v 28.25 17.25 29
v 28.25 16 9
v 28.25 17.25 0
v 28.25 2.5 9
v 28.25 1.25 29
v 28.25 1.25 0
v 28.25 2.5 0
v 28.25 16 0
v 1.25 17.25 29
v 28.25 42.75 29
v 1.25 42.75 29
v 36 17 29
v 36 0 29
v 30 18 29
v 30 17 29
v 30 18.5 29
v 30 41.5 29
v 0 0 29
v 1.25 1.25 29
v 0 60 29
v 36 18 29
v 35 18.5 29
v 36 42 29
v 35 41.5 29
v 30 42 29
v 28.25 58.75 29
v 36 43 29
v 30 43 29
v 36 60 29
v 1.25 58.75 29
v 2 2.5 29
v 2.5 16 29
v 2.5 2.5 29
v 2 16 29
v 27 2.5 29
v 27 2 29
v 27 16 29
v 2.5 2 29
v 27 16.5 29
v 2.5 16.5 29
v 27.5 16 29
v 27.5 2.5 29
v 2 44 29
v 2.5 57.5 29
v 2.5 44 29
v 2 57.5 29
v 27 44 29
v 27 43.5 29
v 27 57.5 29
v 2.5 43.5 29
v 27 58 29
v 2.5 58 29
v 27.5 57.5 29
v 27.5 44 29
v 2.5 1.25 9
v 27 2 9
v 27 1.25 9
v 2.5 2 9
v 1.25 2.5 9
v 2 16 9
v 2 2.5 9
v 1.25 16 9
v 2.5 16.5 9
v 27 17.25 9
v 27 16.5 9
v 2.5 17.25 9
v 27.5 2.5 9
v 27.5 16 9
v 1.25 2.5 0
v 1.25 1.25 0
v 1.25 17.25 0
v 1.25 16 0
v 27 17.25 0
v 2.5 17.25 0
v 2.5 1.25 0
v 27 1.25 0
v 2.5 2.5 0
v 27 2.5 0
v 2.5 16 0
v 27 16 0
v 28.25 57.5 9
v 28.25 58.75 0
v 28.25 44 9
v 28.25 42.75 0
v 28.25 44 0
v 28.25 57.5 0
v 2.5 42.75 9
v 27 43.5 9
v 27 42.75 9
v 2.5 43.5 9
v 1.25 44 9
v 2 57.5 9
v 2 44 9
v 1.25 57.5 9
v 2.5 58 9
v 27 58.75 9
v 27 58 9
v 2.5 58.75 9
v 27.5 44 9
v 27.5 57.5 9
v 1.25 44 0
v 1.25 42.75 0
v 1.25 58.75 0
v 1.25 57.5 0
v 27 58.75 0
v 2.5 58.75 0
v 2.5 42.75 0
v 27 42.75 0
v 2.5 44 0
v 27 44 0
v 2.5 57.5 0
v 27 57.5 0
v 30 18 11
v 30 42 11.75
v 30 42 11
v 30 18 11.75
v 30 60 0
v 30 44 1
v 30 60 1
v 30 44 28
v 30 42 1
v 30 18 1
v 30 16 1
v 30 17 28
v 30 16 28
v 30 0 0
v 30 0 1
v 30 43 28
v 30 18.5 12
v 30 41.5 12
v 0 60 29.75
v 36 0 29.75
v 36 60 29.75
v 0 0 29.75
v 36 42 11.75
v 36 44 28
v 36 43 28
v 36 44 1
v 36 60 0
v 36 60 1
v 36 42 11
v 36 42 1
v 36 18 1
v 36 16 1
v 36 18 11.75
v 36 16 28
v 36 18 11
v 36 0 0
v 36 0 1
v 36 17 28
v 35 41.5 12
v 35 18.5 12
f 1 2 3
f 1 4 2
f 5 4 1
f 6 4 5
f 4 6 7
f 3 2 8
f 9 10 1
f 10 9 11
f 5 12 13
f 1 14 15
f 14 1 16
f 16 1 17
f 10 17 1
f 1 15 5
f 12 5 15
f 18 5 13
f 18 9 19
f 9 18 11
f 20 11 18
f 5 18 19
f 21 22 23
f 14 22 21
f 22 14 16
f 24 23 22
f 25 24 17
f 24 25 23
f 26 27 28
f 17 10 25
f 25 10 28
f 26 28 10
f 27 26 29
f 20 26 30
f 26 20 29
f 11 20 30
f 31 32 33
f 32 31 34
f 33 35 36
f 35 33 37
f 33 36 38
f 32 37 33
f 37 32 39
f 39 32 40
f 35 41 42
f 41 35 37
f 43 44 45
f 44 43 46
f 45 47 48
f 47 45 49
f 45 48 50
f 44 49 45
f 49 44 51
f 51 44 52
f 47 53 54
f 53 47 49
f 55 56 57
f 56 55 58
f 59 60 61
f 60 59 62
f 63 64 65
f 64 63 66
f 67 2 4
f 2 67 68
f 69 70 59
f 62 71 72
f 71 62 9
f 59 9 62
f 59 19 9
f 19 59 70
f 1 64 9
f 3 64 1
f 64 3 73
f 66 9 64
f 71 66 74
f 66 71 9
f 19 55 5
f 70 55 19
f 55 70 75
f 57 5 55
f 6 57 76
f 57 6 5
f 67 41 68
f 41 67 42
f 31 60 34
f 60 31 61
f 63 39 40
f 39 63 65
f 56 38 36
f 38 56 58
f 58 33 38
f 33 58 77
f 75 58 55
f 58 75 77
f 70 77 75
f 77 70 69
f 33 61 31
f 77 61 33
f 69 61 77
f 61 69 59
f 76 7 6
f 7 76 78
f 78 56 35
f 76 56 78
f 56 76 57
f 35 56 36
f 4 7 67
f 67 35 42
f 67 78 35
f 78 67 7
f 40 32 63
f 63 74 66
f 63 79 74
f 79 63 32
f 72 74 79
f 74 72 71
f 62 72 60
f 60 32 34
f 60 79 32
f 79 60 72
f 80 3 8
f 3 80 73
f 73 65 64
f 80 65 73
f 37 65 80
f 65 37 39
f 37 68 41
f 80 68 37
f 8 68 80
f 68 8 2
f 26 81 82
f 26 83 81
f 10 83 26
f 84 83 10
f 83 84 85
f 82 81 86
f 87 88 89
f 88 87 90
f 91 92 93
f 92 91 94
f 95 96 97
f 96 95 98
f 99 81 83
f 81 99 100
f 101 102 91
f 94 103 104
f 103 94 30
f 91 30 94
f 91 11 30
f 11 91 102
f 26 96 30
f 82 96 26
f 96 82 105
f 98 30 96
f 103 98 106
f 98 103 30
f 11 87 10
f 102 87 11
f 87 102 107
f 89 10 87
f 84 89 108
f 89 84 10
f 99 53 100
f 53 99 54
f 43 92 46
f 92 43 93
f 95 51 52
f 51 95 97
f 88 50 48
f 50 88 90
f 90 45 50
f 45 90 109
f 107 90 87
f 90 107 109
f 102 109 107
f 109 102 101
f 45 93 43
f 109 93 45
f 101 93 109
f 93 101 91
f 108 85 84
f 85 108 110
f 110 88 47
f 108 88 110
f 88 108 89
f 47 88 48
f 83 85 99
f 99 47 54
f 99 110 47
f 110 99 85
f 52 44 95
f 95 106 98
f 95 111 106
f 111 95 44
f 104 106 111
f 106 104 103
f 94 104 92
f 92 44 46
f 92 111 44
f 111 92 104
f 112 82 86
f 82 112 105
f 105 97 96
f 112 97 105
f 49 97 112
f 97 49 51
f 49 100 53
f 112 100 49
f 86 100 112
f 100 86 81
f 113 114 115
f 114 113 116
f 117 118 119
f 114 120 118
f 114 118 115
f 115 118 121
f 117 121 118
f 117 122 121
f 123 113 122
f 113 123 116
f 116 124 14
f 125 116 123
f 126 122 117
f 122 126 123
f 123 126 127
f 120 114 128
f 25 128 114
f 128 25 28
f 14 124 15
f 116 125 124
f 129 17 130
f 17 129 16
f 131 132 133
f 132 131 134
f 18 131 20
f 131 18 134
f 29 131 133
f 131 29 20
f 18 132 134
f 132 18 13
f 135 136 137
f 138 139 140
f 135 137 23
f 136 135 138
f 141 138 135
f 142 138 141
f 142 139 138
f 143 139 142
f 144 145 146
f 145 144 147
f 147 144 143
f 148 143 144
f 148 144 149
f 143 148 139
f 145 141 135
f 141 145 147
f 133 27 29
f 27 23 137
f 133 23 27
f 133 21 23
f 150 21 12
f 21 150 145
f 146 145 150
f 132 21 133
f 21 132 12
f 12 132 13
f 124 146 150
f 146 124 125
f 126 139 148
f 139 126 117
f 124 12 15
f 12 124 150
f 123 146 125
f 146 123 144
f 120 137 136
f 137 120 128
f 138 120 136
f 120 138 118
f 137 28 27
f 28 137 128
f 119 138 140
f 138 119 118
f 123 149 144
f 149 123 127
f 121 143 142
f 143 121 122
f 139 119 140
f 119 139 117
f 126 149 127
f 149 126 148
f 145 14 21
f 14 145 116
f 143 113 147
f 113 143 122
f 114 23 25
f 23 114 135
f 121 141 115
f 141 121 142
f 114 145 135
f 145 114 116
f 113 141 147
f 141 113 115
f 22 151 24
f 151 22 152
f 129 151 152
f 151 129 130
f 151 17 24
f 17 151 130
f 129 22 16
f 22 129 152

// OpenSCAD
/* dimensions in inches */

top_width = 60;
top_depth = 30;
top_thickness = .75;

leg_length = 29;
leg_thickness = 1.25;

overhang = 1.25;

plinth_bottom = 9;
plinth_height = leg_length - plinth_bottom;
plinth_depth = 27;
plinth_width = 16;
plinth_wall = .75;

payload_width = 23;
payload_height = 17;
payload_depth = 5;

extension_depth = 6;
extension_support_thickness = 1;
extension_payload_holder_width = payload_width + 1;
extension_payload_holder_height = payload_height + 1;
extension_support_length = leg_length - 1;
extension_payload_base_width = top_width;

module leg() {
     cube(size=[leg_thickness, leg_thickness, leg_length]);
}

module top() {
     cube(size=[top_depth, top_width, top_thickness]);
}

module plinth() {
     union() {
	  leg();
	  translate([plinth_depth-leg_thickness, 0, 0]) leg();
	  translate([0, plinth_width-leg_thickness, 0]) leg();
	  translate([plinth_depth-leg_thickness, plinth_width-leg_thickness, 0]) leg();
	  translate([0,0,plinth_bottom]) {
	       difference() {
		    cube(size=[plinth_depth, plinth_width, plinth_height]);
		    translate([plinth_wall, plinth_wall, 0]) {
			 cube(size=[plinth_depth-2*plinth_wall,
				    plinth_width-2*plinth_wall,
				    plinth_height]);

		    }
	       }
	  }
     }
}

module desk() {
     union() {
	  translate([overhang, overhang, 0]) plinth();
	  translate([overhang, top_width - (plinth_width + overhang), 0]) plinth();
	  translate([0,0,leg_length]) top();
     }
}

module payload() {
     translate([0,(top_width-payload_width)/2, leg_length-payload_height]) cube(size=[payload_depth, payload_width, payload_height]);
     }

module extension() {
     union() {
	  translate([0,0,leg_length]) cube(size=[extension_depth, top_width, top_thickness]);
	  translate([0,top_width/2 - ((extension_payload_holder_width / 2) + extension_support_thickness), leg_length - extension_support_length])
	       cube(size=[extension_depth, extension_support_thickness, extension_support_length]);
	  translate([0,top_width/2 + (extension_payload_holder_width / 2), leg_length - extension_support_length])
	       cube(size=[extension_depth, extension_support_thickness, extension_support_length]);
	  translate([0,top_width/2 - (extension_payload_holder_width / 2),leg_length-extension_payload_holder_height]) cube(size=[extension_depth, extension_payload_holder_width, top_thickness]);
     }

}

module extension_base() {
     union() {
	  translate([0,top_width/2 - ((extension_payload_holder_width / 2) + extension_support_thickness*2), 0])
	       cube(size=[extension_depth, extension_support_thickness, extension_support_length]);
	  translate([0,top_width/2 + ((extension_payload_holder_width / 2) + extension_support_thickness), 0])
	       cube(size=[extension_depth, extension_support_thickness, extension_support_length]);
	  translate([0, 0, 0])
	       cube(size=[extension_depth,
                          extension_payload_base_width,
                          extension_support_thickness]);
     }
}

desk();
translate([top_depth, 0, 0]) color([1,0,0]) extension_base();
raise = $t < 0.25 ? $t*4 : $t > 0.75 ? (1.0 - $t) * 4 : 1;
push_forward = ($t < 0.25 || $t > 0.75) ? 0 : ($t < 0.5 ? $t - 0.25 : 0.75 - $t);
translate([top_depth, 0, 0]) {
     translate([0,0,raise * extension_payload_holder_height]) {
	  color ([0,1,0]) extension();
	  translate([push_forward*-48,0,0])
	       color([0,0,1]) payload();
     }
}
